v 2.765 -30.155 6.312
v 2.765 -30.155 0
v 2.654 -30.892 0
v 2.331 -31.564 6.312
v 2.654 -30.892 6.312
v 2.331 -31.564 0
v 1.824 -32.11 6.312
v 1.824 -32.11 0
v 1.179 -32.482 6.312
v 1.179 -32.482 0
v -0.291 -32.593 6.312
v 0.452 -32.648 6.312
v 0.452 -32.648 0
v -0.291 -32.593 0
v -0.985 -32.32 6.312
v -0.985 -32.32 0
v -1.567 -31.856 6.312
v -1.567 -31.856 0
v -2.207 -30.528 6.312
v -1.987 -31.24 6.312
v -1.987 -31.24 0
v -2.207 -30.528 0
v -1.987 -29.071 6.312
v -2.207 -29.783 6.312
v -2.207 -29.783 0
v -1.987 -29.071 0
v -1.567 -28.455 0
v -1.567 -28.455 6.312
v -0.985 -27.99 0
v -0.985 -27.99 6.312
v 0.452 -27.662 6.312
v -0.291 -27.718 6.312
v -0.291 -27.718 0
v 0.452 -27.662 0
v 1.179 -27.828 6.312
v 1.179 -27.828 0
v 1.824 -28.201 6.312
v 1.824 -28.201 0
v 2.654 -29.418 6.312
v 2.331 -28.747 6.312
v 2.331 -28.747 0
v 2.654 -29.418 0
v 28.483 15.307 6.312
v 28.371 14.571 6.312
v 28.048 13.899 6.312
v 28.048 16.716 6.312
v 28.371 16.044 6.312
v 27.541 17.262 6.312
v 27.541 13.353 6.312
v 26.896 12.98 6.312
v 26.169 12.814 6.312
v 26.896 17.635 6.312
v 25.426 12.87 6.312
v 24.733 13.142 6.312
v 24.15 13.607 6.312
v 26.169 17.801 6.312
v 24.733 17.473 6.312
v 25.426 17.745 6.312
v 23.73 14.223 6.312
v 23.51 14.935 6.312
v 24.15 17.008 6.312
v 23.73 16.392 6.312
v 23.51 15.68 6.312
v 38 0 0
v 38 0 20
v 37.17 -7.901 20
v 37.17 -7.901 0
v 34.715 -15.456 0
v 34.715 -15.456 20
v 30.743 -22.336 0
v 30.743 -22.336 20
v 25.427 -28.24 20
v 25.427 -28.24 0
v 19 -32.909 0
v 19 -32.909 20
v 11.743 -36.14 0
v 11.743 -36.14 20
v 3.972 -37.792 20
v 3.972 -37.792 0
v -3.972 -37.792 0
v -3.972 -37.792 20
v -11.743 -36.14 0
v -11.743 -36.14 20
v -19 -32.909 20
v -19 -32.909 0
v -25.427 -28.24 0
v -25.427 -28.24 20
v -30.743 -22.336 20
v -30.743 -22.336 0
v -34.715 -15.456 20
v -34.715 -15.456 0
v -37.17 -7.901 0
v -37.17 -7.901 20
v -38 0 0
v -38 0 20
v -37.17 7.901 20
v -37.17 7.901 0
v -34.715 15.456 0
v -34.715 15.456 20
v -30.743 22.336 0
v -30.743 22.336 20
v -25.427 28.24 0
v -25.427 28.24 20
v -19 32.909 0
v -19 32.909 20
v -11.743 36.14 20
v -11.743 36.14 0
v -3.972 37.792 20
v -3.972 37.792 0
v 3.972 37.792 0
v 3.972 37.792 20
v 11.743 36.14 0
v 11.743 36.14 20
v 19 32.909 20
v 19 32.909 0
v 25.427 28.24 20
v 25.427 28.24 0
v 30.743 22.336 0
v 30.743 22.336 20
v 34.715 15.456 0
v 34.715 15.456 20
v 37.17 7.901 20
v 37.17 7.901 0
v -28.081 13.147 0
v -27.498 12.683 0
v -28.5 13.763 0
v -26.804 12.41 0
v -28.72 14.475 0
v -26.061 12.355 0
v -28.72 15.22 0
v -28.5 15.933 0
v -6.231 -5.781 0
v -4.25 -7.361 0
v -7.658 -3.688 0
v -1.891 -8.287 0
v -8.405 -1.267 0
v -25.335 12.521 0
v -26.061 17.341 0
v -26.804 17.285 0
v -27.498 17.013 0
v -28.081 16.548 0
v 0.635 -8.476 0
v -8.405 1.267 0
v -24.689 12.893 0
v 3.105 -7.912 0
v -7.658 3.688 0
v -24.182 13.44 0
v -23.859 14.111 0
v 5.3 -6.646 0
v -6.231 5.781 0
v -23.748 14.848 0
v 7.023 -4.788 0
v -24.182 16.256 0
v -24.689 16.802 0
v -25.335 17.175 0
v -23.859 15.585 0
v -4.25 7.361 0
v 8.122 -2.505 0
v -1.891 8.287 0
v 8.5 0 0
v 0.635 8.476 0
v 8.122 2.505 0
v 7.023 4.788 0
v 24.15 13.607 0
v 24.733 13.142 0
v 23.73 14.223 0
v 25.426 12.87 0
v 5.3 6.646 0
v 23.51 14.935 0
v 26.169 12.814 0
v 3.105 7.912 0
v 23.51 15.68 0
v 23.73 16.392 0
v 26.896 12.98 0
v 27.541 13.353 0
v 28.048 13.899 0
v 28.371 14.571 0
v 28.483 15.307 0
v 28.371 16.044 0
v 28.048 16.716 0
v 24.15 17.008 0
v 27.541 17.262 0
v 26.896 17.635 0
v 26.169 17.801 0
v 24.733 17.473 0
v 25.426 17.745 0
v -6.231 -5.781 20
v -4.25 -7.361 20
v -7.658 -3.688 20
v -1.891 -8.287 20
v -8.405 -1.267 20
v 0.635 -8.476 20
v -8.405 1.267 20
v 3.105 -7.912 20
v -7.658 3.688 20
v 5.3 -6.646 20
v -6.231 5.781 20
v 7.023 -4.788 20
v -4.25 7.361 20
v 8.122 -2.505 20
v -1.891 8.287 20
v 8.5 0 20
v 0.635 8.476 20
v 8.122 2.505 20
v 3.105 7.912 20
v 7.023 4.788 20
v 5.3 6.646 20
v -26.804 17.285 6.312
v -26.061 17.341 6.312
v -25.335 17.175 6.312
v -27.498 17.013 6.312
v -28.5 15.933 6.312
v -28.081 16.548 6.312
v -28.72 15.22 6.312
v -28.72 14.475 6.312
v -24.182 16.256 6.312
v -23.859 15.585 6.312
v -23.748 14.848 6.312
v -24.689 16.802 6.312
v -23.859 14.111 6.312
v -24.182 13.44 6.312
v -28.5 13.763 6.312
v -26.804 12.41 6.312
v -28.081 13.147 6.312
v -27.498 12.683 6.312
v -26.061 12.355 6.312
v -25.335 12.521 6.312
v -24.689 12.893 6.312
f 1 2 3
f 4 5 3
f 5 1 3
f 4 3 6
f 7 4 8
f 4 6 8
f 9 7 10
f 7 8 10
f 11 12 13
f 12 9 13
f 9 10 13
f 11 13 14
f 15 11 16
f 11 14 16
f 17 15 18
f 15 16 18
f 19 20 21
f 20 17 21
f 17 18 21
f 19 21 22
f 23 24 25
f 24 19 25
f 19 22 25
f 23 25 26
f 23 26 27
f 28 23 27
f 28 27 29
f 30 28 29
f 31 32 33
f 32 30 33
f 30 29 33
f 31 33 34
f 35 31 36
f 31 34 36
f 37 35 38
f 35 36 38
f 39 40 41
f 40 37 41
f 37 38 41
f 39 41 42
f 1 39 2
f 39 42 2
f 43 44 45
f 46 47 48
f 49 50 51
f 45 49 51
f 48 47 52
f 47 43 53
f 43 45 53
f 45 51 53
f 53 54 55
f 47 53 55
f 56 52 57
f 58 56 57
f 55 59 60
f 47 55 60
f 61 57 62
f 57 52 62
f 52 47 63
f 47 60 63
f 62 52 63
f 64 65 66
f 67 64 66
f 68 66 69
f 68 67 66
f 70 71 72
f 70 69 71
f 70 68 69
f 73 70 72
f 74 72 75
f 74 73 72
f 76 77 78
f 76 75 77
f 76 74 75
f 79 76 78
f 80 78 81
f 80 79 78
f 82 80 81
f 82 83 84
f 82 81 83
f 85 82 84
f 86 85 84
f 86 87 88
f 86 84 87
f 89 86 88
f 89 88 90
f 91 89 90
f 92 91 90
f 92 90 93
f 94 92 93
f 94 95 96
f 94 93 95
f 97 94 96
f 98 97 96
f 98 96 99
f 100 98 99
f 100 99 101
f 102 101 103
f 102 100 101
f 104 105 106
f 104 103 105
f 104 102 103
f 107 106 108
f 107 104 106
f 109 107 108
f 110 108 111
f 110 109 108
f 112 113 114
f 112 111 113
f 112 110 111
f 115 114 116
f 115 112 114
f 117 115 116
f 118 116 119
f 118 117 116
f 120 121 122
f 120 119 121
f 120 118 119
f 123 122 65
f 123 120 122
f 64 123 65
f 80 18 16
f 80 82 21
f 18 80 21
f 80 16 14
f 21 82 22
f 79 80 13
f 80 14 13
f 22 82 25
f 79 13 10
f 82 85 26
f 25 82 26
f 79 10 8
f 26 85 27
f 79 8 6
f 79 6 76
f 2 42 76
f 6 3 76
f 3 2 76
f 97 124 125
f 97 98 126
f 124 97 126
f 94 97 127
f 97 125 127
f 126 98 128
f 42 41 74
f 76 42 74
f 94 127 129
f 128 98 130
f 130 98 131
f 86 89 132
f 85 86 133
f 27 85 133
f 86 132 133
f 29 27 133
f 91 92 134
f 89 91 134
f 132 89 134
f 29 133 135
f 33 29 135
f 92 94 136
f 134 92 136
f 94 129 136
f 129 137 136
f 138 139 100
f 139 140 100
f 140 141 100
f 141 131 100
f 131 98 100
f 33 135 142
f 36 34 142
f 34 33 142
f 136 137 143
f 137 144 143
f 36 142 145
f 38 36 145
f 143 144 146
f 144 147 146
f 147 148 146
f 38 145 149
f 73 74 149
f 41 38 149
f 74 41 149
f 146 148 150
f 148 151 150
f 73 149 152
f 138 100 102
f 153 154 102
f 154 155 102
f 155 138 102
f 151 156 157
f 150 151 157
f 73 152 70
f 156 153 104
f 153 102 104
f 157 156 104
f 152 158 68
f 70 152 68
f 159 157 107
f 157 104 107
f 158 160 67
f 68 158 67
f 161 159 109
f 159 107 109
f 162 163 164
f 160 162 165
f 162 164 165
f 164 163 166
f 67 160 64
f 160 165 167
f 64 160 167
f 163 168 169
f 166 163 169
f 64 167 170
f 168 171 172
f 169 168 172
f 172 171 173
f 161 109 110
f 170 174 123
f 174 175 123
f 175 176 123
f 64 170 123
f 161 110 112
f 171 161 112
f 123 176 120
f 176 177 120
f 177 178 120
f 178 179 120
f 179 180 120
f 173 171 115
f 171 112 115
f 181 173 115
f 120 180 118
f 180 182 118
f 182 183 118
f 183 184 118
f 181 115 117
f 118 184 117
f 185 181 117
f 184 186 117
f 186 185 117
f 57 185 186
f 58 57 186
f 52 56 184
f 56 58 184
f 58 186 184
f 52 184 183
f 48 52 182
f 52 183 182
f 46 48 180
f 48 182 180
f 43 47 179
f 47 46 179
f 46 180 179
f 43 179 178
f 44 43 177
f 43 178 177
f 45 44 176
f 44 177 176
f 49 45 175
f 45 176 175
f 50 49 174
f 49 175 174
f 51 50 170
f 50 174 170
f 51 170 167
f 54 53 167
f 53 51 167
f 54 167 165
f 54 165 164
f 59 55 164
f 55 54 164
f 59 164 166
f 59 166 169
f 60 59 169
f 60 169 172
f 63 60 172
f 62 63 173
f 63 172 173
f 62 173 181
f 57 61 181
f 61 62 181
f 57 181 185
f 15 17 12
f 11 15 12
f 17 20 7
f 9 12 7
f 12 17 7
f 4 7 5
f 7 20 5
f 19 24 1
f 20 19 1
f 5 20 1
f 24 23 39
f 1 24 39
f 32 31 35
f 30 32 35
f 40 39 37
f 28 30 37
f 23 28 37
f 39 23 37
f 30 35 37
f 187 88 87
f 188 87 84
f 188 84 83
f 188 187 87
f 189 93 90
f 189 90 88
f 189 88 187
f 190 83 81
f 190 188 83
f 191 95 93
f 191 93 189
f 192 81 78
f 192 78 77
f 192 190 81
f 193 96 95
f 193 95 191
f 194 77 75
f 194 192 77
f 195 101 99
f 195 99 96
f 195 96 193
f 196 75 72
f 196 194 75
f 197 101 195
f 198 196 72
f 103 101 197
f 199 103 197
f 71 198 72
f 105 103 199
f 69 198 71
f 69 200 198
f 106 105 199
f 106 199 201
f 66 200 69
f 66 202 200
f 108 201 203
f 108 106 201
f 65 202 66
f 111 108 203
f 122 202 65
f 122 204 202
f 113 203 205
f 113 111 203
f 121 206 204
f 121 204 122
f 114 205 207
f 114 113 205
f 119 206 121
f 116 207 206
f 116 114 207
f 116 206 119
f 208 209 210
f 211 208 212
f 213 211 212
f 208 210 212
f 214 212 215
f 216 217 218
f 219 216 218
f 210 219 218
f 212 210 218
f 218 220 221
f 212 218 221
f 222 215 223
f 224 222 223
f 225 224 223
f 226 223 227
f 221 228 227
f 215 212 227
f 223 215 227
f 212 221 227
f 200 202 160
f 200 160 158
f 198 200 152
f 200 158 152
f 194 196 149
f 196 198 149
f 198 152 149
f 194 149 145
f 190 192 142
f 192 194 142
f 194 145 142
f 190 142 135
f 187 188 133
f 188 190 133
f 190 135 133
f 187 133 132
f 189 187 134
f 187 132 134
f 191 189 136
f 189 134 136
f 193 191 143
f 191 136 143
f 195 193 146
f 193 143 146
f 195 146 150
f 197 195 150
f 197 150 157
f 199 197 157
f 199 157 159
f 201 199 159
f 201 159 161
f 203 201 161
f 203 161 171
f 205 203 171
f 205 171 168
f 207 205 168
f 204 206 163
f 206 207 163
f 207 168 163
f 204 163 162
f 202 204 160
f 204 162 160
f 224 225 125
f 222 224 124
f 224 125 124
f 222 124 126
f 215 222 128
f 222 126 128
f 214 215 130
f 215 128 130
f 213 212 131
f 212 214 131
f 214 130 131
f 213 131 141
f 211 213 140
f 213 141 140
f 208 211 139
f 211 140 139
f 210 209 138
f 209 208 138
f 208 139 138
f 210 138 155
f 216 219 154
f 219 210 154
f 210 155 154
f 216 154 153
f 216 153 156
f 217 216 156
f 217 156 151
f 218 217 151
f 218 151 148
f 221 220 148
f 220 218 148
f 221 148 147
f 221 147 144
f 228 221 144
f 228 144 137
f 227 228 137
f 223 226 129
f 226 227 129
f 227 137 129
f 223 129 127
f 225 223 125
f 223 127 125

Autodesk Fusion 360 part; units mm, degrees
sketch "Sketch1" plane through (0, 0, 0) normal (0, 0, 1) x (1, 0, 0)
  circle A0 centre (0, 0) radius 8.5
  circle A1 centre (0, 0) radius 22.5
  circle A2 centre (0, 0) radius 38
  dimension "d1" = 45
  dimension "d2" = 17
  dimension "d3" = 76
extrude "Extrude1" add sketch "Sketch1" along normal blind 20 contours A1
sketch "Sketch2" plane through (0, 0, 0) normal (0, 0, 1) x (1, 0, 0)
  circle A0 centre (0.2654, -30.1553) radius 2.5
  dimension "d8" = 5
extrude "Extrude4" add sketch "Sketch1" along normal blind 20 contours A1 | A2
extrude "Extrude5" cut sketch "Sketch2" along normal blind 6.312
pattern_circular "C-Pattern2" count 3 over 360 about axis through (0, 0, 20) along (0, 0, 1) of "Extrude5"
